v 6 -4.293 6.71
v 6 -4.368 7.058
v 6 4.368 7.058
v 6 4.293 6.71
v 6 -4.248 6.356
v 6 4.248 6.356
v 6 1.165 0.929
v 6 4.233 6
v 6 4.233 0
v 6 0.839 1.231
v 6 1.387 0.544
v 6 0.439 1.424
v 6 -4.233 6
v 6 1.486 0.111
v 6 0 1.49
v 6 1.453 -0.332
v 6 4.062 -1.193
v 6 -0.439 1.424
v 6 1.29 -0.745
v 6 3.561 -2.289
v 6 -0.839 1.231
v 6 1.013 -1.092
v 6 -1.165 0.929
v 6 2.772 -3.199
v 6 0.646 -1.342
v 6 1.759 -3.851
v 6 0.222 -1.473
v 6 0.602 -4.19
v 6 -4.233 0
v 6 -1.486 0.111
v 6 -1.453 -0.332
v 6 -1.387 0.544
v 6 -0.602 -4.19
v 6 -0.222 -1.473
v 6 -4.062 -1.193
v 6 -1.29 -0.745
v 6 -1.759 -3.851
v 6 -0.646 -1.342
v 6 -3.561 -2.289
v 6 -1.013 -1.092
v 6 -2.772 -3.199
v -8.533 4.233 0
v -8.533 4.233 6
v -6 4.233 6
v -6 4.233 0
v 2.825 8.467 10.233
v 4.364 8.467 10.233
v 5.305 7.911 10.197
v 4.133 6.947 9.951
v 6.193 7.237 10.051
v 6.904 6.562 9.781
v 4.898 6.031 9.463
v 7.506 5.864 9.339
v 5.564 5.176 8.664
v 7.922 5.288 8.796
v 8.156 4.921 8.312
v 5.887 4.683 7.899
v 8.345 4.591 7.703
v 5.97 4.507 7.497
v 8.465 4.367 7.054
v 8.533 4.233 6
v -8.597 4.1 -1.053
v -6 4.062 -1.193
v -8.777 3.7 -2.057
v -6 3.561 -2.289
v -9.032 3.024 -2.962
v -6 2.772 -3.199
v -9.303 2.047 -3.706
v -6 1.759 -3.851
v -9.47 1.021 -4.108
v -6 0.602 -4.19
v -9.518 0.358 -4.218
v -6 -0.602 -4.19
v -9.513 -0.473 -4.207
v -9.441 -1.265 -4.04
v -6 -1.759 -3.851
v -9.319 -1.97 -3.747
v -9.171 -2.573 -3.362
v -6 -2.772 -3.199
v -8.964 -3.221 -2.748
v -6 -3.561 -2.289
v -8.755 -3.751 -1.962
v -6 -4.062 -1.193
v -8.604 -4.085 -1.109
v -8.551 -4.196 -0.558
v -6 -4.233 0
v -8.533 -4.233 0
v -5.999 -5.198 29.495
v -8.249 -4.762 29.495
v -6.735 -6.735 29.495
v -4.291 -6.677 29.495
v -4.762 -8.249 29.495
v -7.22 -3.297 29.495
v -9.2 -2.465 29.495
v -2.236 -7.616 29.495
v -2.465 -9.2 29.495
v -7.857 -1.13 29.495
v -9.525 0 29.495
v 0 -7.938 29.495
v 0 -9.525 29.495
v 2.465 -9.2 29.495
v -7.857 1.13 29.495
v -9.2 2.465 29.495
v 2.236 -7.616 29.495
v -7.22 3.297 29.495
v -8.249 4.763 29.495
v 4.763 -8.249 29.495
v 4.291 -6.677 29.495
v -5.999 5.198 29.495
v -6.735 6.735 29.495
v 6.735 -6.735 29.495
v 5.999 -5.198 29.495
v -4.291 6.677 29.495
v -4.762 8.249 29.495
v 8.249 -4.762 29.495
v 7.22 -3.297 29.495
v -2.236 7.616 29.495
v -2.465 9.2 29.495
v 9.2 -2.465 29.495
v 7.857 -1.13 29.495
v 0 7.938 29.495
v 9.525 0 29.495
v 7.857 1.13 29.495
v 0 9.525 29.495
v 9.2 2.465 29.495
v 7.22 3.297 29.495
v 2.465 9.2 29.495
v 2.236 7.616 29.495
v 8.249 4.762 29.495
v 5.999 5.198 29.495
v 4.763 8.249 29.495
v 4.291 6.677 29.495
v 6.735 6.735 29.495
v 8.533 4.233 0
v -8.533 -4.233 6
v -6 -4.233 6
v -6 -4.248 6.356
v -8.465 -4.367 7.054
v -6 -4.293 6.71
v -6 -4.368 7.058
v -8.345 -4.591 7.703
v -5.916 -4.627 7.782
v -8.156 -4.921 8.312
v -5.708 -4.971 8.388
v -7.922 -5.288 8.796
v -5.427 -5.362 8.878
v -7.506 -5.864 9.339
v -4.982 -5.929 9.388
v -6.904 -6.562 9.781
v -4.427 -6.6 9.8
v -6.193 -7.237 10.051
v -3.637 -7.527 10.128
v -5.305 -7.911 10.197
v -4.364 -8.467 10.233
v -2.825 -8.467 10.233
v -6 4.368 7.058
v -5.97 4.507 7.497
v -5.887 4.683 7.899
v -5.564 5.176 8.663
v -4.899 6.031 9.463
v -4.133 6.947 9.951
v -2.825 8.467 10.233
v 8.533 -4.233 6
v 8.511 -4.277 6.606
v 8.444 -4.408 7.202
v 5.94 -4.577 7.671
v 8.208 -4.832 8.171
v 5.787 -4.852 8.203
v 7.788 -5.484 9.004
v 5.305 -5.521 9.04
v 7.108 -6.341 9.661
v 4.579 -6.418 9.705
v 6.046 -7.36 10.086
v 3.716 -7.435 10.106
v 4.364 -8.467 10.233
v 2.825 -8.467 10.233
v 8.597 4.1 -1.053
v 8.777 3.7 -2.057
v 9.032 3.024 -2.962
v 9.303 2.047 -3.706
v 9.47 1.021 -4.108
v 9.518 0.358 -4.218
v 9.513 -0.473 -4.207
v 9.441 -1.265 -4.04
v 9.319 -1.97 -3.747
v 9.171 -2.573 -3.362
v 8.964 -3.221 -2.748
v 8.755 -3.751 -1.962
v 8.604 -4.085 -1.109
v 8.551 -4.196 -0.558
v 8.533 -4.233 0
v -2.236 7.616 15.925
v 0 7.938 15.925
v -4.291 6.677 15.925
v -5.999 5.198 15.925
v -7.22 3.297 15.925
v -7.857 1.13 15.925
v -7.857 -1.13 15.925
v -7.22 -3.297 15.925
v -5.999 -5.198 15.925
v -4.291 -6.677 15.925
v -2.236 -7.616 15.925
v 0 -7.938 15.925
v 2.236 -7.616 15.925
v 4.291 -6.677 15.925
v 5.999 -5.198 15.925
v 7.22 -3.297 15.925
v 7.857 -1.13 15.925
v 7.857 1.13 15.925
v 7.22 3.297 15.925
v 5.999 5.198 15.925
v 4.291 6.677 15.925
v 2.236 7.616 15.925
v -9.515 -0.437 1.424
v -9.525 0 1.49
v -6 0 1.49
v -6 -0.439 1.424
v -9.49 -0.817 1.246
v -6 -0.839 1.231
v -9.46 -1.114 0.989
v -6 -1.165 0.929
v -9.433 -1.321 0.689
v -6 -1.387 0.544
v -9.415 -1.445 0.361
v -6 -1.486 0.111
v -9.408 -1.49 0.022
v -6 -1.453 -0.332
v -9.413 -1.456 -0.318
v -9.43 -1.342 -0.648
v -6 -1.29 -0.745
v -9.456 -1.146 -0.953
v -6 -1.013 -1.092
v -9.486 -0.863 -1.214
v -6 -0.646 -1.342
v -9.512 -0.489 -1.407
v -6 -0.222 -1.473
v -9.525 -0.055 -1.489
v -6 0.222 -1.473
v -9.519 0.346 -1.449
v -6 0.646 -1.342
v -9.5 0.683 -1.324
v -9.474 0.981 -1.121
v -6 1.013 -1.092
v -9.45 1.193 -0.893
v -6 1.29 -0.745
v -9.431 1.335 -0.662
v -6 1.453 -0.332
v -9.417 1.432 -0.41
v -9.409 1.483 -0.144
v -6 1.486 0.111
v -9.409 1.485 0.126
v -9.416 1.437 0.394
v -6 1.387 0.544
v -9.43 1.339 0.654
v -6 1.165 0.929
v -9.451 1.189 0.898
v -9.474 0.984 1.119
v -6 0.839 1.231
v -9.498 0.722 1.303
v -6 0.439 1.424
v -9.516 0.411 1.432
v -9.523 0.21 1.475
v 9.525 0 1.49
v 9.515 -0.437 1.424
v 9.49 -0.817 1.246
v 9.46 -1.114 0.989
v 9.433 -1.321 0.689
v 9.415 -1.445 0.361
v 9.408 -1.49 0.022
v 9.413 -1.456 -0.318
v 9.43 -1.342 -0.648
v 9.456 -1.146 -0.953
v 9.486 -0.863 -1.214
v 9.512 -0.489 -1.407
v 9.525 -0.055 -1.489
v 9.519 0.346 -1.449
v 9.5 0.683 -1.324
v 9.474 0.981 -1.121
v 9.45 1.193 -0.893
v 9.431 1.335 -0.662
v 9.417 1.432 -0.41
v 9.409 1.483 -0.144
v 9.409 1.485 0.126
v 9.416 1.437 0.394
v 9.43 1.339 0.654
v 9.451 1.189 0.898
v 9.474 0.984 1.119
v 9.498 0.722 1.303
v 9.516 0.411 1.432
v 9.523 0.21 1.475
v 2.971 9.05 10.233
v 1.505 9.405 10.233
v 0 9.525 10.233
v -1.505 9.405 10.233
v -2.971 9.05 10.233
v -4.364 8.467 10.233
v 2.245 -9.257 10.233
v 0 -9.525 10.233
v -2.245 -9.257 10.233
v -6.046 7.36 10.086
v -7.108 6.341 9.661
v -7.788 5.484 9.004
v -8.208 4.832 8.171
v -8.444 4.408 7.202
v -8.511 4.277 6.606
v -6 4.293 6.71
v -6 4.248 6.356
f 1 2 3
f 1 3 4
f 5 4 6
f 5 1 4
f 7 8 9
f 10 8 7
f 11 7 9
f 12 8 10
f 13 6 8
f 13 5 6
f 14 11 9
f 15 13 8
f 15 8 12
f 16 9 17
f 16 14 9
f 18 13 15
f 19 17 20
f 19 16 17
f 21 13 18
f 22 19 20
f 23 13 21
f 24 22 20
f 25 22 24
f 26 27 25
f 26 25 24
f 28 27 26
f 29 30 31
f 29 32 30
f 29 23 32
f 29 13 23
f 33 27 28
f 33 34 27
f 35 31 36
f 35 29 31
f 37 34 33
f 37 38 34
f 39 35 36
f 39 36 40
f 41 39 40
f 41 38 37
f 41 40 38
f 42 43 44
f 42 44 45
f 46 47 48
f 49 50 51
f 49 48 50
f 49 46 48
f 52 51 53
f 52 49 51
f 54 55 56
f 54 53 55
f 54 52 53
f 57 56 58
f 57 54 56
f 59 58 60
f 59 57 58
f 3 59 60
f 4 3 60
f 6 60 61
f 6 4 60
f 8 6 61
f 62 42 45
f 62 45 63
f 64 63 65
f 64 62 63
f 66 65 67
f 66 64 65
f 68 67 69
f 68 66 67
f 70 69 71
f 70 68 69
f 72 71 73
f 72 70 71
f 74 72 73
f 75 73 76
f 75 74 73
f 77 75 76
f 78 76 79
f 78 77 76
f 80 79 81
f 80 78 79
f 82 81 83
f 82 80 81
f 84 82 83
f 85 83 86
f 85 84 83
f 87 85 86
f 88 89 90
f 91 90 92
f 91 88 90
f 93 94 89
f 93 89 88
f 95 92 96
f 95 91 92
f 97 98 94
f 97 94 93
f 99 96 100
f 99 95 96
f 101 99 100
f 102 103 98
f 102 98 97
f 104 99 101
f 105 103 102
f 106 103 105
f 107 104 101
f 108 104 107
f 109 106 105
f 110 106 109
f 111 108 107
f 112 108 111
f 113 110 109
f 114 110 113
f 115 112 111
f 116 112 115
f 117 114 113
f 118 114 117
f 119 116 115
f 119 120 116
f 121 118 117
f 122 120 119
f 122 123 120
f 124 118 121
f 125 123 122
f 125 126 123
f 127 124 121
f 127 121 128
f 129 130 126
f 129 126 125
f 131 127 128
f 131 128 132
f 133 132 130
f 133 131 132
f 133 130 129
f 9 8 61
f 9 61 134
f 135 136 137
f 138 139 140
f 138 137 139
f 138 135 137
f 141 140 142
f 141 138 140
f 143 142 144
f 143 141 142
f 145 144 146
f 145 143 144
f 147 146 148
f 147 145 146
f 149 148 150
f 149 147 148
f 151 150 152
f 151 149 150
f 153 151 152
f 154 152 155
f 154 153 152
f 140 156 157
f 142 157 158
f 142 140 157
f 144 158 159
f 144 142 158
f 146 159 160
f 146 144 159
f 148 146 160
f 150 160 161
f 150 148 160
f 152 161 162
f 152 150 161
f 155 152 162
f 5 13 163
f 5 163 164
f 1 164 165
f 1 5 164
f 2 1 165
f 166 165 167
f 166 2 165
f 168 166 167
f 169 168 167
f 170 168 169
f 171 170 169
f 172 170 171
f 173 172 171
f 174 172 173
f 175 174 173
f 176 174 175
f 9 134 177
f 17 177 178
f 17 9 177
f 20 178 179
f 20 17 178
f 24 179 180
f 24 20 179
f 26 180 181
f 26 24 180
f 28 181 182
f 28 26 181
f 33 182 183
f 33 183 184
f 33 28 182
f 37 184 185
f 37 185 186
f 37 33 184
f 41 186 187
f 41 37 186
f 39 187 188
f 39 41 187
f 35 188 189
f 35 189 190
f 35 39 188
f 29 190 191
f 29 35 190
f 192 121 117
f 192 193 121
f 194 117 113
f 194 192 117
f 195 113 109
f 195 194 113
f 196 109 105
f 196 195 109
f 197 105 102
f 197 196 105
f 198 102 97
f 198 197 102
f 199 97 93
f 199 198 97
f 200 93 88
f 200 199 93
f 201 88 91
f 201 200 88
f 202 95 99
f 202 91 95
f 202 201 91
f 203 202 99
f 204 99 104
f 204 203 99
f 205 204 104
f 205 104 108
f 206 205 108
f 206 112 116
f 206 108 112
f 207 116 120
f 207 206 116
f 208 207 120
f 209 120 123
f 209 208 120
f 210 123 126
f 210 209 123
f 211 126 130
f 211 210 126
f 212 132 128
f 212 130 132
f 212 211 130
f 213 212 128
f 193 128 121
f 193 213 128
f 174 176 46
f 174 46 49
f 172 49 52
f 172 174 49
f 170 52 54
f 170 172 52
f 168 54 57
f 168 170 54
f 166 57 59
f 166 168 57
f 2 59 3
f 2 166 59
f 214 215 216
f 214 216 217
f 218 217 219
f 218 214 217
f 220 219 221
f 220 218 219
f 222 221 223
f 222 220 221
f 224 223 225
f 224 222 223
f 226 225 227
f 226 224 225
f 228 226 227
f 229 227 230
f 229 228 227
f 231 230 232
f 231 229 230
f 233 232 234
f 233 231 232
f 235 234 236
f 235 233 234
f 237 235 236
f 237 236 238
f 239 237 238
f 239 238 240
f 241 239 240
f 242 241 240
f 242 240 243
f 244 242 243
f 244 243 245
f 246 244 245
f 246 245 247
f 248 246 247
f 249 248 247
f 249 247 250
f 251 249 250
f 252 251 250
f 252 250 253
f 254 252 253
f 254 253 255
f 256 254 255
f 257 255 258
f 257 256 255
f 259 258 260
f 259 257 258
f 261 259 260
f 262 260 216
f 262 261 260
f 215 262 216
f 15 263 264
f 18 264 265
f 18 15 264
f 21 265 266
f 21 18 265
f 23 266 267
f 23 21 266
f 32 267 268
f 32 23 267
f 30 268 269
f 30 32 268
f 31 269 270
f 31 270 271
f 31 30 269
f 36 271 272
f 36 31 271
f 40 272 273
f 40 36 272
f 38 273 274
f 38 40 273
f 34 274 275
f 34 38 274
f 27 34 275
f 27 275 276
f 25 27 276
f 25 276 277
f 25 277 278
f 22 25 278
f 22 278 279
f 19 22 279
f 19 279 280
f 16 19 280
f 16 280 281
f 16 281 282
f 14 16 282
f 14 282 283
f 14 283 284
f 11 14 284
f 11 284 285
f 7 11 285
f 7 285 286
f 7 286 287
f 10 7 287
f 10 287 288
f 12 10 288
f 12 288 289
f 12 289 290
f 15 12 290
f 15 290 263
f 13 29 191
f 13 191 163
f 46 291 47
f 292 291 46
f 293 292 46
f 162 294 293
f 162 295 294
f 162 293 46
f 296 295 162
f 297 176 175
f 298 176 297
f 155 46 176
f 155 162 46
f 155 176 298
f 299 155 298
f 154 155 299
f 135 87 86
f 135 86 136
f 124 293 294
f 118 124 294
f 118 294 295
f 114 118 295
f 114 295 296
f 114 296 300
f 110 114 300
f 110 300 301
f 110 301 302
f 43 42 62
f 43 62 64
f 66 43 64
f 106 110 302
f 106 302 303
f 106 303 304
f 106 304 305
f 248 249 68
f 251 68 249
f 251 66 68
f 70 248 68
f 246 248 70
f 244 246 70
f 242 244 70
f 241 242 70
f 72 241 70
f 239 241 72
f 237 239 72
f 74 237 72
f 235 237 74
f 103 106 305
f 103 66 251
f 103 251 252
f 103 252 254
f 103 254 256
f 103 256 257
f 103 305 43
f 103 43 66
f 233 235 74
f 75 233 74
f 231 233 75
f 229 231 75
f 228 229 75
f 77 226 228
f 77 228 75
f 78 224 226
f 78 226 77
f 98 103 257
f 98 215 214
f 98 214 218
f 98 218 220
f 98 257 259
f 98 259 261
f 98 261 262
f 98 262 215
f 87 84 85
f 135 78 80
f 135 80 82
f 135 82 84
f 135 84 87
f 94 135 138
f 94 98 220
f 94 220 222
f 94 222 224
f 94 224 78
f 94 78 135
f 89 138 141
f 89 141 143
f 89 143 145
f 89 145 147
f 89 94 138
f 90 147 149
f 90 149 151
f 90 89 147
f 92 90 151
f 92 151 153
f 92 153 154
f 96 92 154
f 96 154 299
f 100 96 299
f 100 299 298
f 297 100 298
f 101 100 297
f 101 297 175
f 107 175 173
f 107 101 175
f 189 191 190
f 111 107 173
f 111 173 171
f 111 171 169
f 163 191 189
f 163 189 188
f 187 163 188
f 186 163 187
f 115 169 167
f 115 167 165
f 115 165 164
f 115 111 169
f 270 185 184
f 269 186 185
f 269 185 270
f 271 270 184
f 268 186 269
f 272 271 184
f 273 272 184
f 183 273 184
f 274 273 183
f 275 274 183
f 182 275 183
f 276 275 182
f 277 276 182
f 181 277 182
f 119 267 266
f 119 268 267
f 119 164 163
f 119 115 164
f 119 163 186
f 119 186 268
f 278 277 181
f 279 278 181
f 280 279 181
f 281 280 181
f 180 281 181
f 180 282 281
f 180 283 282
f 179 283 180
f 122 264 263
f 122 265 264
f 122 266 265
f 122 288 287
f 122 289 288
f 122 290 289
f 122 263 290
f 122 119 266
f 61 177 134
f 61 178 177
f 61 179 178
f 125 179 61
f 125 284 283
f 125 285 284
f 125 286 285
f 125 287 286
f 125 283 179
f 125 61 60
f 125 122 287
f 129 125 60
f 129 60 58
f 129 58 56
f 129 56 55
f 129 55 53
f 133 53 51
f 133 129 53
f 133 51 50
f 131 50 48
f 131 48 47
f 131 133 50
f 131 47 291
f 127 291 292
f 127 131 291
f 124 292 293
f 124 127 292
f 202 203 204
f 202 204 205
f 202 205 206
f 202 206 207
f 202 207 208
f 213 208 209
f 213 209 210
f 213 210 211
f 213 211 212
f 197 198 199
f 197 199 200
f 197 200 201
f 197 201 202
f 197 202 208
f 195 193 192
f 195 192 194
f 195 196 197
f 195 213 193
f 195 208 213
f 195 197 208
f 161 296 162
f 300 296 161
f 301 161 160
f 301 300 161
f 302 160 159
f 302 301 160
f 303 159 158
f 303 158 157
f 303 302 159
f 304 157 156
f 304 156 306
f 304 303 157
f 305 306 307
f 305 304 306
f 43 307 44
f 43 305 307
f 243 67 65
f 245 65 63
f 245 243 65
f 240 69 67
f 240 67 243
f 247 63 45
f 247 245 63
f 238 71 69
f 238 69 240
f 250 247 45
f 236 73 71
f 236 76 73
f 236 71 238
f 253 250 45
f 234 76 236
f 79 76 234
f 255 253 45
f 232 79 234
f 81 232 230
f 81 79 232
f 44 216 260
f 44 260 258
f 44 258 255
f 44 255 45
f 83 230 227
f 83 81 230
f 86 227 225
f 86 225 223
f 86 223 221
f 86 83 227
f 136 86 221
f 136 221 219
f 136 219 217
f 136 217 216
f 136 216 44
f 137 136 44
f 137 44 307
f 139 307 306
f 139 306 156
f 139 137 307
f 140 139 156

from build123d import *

# Parameters (mm, degrees)
CUT_EXTRUDE1_DEPTH      = 38.432697939
CUT_EXTRUDE1_DEPTH_BACK = 38.432697939
CUT_EXTRUDE2_DEPTH      = 38.432698083
CUT_EXTRUDE2_DEPTH_BACK = 38.432698083
SKETCH5_W               = 23.799010272
SKETCH5_H               = 22.882778694
CUT_EXTRUDE3_DEPTH      = 5.43
CUT_EXTRUDE4_DEPTH      = 25.43
CUT_EXTRUDE4_DEPTH_BACK = 15.43
SKETCH6_R               = 1.49


with BuildPart() as part:
    # Sketch1 → Revolve1 (revolve)
    with BuildSketch(Plane(origin=(0, 0, 0), x_dir=(0, 0, -1), z_dir=(1, 0, 0))):
        Polygon((-34.925, 9.525), (-34.925, 7.9375), (-15.925, 7.9375), (-15.925, 0), (9.525, 0), (9.525, 9.525), align=None)
    revolve(axis=Axis((0, 0, 0), (0, 0, 1)))

    # Sketch3 → Cut-Extrude1 (cut, two sides: drawn at the far end of the back side and taken through both)
    with BuildSketch(Plane(origin=(0, 0, 0), x_dir=(0, 0, -1), z_dir=(1, 0, 0)).offset(-CUT_EXTRUDE1_DEPTH_BACK)):
        with BuildLine():
            Line((9.525, 9.525), (-10.233333333, 9.525))
            Line((-10.233333333, 9.525), (-10.233333333, 8.466666667))
            ThreePointArc((-10.233333333, 8.466666667), (-8.993418707, 5.47324796), (-6, 4.233333333))
            Line((-6, 4.233333333), (0, 4.233333333))
            ThreePointArc((0, 4.233333333), (4.233333333, 0), (0, -4.233333333))
            Line((0, -4.233333333), (-6, -4.233333333))
            ThreePointArc((-6, -4.233333333), (-8.993418707, -5.47324796), (-10.233333333, -8.466666667))
            Line((-10.233333333, -8.466666667), (-10.233333333, -9.525))
            Line((-10.233333333, -9.525), (9.525, -9.525))
            Line((9.525, -9.525), (9.525, 9.525))
        make_face()
    extrude(amount=CUT_EXTRUDE1_DEPTH + CUT_EXTRUDE1_DEPTH_BACK, mode=Mode.SUBTRACT)

    # Sketch4 → Cut-Extrude2 (cut, two sides: drawn at the far end of the back side and taken through both)
    with BuildSketch(Plane(origin=(0, 0, 0), x_dir=(1, 0, 0), z_dir=(0, 1, 0)).offset(-CUT_EXTRUDE2_DEPTH_BACK)):
        with BuildLine():
            Line((-2.825, -10.233333333), (2.825, -10.233333333))
            ThreePointArc((2.825, -10.233333333), (5.07006403, -9.303397364), (6, -7.058333333))
            Line((6, -7.058333333), (6, 4.233333333))
            Line((6, 4.233333333), (-6, 4.233333333))
            Line((-6, 4.233333333), (-6, -7.058333333))
            ThreePointArc((-6, -7.058333333), (-5.07006403, -9.303397364), (-2.825, -10.233333333))
        make_face()
    extrude(amount=CUT_EXTRUDE2_DEPTH + CUT_EXTRUDE2_DEPTH_BACK, mode=Mode.SUBTRACT)

    # Sketch5 → Cut-Extrude3 (cut)
    with BuildSketch(Plane.XY.offset(34.925)):
        Rectangle(SKETCH5_W, SKETCH5_H)
    extrude(amount=-CUT_EXTRUDE3_DEPTH, mode=Mode.SUBTRACT)

    # Sketch6 → Cut-Extrude4 (cut, two sides: drawn at the far end of the back side and taken through both)
    with BuildSketch(Plane(origin=(-6, 0, 0), x_dir=(0, 0, -1), z_dir=(1, 0, 0)).offset(-CUT_EXTRUDE4_DEPTH_BACK)):
        Circle(SKETCH6_R)
    extrude(amount=CUT_EXTRUDE4_DEPTH + CUT_EXTRUDE4_DEPTH_BACK, mode=Mode.SUBTRACT)


solid = part.part
